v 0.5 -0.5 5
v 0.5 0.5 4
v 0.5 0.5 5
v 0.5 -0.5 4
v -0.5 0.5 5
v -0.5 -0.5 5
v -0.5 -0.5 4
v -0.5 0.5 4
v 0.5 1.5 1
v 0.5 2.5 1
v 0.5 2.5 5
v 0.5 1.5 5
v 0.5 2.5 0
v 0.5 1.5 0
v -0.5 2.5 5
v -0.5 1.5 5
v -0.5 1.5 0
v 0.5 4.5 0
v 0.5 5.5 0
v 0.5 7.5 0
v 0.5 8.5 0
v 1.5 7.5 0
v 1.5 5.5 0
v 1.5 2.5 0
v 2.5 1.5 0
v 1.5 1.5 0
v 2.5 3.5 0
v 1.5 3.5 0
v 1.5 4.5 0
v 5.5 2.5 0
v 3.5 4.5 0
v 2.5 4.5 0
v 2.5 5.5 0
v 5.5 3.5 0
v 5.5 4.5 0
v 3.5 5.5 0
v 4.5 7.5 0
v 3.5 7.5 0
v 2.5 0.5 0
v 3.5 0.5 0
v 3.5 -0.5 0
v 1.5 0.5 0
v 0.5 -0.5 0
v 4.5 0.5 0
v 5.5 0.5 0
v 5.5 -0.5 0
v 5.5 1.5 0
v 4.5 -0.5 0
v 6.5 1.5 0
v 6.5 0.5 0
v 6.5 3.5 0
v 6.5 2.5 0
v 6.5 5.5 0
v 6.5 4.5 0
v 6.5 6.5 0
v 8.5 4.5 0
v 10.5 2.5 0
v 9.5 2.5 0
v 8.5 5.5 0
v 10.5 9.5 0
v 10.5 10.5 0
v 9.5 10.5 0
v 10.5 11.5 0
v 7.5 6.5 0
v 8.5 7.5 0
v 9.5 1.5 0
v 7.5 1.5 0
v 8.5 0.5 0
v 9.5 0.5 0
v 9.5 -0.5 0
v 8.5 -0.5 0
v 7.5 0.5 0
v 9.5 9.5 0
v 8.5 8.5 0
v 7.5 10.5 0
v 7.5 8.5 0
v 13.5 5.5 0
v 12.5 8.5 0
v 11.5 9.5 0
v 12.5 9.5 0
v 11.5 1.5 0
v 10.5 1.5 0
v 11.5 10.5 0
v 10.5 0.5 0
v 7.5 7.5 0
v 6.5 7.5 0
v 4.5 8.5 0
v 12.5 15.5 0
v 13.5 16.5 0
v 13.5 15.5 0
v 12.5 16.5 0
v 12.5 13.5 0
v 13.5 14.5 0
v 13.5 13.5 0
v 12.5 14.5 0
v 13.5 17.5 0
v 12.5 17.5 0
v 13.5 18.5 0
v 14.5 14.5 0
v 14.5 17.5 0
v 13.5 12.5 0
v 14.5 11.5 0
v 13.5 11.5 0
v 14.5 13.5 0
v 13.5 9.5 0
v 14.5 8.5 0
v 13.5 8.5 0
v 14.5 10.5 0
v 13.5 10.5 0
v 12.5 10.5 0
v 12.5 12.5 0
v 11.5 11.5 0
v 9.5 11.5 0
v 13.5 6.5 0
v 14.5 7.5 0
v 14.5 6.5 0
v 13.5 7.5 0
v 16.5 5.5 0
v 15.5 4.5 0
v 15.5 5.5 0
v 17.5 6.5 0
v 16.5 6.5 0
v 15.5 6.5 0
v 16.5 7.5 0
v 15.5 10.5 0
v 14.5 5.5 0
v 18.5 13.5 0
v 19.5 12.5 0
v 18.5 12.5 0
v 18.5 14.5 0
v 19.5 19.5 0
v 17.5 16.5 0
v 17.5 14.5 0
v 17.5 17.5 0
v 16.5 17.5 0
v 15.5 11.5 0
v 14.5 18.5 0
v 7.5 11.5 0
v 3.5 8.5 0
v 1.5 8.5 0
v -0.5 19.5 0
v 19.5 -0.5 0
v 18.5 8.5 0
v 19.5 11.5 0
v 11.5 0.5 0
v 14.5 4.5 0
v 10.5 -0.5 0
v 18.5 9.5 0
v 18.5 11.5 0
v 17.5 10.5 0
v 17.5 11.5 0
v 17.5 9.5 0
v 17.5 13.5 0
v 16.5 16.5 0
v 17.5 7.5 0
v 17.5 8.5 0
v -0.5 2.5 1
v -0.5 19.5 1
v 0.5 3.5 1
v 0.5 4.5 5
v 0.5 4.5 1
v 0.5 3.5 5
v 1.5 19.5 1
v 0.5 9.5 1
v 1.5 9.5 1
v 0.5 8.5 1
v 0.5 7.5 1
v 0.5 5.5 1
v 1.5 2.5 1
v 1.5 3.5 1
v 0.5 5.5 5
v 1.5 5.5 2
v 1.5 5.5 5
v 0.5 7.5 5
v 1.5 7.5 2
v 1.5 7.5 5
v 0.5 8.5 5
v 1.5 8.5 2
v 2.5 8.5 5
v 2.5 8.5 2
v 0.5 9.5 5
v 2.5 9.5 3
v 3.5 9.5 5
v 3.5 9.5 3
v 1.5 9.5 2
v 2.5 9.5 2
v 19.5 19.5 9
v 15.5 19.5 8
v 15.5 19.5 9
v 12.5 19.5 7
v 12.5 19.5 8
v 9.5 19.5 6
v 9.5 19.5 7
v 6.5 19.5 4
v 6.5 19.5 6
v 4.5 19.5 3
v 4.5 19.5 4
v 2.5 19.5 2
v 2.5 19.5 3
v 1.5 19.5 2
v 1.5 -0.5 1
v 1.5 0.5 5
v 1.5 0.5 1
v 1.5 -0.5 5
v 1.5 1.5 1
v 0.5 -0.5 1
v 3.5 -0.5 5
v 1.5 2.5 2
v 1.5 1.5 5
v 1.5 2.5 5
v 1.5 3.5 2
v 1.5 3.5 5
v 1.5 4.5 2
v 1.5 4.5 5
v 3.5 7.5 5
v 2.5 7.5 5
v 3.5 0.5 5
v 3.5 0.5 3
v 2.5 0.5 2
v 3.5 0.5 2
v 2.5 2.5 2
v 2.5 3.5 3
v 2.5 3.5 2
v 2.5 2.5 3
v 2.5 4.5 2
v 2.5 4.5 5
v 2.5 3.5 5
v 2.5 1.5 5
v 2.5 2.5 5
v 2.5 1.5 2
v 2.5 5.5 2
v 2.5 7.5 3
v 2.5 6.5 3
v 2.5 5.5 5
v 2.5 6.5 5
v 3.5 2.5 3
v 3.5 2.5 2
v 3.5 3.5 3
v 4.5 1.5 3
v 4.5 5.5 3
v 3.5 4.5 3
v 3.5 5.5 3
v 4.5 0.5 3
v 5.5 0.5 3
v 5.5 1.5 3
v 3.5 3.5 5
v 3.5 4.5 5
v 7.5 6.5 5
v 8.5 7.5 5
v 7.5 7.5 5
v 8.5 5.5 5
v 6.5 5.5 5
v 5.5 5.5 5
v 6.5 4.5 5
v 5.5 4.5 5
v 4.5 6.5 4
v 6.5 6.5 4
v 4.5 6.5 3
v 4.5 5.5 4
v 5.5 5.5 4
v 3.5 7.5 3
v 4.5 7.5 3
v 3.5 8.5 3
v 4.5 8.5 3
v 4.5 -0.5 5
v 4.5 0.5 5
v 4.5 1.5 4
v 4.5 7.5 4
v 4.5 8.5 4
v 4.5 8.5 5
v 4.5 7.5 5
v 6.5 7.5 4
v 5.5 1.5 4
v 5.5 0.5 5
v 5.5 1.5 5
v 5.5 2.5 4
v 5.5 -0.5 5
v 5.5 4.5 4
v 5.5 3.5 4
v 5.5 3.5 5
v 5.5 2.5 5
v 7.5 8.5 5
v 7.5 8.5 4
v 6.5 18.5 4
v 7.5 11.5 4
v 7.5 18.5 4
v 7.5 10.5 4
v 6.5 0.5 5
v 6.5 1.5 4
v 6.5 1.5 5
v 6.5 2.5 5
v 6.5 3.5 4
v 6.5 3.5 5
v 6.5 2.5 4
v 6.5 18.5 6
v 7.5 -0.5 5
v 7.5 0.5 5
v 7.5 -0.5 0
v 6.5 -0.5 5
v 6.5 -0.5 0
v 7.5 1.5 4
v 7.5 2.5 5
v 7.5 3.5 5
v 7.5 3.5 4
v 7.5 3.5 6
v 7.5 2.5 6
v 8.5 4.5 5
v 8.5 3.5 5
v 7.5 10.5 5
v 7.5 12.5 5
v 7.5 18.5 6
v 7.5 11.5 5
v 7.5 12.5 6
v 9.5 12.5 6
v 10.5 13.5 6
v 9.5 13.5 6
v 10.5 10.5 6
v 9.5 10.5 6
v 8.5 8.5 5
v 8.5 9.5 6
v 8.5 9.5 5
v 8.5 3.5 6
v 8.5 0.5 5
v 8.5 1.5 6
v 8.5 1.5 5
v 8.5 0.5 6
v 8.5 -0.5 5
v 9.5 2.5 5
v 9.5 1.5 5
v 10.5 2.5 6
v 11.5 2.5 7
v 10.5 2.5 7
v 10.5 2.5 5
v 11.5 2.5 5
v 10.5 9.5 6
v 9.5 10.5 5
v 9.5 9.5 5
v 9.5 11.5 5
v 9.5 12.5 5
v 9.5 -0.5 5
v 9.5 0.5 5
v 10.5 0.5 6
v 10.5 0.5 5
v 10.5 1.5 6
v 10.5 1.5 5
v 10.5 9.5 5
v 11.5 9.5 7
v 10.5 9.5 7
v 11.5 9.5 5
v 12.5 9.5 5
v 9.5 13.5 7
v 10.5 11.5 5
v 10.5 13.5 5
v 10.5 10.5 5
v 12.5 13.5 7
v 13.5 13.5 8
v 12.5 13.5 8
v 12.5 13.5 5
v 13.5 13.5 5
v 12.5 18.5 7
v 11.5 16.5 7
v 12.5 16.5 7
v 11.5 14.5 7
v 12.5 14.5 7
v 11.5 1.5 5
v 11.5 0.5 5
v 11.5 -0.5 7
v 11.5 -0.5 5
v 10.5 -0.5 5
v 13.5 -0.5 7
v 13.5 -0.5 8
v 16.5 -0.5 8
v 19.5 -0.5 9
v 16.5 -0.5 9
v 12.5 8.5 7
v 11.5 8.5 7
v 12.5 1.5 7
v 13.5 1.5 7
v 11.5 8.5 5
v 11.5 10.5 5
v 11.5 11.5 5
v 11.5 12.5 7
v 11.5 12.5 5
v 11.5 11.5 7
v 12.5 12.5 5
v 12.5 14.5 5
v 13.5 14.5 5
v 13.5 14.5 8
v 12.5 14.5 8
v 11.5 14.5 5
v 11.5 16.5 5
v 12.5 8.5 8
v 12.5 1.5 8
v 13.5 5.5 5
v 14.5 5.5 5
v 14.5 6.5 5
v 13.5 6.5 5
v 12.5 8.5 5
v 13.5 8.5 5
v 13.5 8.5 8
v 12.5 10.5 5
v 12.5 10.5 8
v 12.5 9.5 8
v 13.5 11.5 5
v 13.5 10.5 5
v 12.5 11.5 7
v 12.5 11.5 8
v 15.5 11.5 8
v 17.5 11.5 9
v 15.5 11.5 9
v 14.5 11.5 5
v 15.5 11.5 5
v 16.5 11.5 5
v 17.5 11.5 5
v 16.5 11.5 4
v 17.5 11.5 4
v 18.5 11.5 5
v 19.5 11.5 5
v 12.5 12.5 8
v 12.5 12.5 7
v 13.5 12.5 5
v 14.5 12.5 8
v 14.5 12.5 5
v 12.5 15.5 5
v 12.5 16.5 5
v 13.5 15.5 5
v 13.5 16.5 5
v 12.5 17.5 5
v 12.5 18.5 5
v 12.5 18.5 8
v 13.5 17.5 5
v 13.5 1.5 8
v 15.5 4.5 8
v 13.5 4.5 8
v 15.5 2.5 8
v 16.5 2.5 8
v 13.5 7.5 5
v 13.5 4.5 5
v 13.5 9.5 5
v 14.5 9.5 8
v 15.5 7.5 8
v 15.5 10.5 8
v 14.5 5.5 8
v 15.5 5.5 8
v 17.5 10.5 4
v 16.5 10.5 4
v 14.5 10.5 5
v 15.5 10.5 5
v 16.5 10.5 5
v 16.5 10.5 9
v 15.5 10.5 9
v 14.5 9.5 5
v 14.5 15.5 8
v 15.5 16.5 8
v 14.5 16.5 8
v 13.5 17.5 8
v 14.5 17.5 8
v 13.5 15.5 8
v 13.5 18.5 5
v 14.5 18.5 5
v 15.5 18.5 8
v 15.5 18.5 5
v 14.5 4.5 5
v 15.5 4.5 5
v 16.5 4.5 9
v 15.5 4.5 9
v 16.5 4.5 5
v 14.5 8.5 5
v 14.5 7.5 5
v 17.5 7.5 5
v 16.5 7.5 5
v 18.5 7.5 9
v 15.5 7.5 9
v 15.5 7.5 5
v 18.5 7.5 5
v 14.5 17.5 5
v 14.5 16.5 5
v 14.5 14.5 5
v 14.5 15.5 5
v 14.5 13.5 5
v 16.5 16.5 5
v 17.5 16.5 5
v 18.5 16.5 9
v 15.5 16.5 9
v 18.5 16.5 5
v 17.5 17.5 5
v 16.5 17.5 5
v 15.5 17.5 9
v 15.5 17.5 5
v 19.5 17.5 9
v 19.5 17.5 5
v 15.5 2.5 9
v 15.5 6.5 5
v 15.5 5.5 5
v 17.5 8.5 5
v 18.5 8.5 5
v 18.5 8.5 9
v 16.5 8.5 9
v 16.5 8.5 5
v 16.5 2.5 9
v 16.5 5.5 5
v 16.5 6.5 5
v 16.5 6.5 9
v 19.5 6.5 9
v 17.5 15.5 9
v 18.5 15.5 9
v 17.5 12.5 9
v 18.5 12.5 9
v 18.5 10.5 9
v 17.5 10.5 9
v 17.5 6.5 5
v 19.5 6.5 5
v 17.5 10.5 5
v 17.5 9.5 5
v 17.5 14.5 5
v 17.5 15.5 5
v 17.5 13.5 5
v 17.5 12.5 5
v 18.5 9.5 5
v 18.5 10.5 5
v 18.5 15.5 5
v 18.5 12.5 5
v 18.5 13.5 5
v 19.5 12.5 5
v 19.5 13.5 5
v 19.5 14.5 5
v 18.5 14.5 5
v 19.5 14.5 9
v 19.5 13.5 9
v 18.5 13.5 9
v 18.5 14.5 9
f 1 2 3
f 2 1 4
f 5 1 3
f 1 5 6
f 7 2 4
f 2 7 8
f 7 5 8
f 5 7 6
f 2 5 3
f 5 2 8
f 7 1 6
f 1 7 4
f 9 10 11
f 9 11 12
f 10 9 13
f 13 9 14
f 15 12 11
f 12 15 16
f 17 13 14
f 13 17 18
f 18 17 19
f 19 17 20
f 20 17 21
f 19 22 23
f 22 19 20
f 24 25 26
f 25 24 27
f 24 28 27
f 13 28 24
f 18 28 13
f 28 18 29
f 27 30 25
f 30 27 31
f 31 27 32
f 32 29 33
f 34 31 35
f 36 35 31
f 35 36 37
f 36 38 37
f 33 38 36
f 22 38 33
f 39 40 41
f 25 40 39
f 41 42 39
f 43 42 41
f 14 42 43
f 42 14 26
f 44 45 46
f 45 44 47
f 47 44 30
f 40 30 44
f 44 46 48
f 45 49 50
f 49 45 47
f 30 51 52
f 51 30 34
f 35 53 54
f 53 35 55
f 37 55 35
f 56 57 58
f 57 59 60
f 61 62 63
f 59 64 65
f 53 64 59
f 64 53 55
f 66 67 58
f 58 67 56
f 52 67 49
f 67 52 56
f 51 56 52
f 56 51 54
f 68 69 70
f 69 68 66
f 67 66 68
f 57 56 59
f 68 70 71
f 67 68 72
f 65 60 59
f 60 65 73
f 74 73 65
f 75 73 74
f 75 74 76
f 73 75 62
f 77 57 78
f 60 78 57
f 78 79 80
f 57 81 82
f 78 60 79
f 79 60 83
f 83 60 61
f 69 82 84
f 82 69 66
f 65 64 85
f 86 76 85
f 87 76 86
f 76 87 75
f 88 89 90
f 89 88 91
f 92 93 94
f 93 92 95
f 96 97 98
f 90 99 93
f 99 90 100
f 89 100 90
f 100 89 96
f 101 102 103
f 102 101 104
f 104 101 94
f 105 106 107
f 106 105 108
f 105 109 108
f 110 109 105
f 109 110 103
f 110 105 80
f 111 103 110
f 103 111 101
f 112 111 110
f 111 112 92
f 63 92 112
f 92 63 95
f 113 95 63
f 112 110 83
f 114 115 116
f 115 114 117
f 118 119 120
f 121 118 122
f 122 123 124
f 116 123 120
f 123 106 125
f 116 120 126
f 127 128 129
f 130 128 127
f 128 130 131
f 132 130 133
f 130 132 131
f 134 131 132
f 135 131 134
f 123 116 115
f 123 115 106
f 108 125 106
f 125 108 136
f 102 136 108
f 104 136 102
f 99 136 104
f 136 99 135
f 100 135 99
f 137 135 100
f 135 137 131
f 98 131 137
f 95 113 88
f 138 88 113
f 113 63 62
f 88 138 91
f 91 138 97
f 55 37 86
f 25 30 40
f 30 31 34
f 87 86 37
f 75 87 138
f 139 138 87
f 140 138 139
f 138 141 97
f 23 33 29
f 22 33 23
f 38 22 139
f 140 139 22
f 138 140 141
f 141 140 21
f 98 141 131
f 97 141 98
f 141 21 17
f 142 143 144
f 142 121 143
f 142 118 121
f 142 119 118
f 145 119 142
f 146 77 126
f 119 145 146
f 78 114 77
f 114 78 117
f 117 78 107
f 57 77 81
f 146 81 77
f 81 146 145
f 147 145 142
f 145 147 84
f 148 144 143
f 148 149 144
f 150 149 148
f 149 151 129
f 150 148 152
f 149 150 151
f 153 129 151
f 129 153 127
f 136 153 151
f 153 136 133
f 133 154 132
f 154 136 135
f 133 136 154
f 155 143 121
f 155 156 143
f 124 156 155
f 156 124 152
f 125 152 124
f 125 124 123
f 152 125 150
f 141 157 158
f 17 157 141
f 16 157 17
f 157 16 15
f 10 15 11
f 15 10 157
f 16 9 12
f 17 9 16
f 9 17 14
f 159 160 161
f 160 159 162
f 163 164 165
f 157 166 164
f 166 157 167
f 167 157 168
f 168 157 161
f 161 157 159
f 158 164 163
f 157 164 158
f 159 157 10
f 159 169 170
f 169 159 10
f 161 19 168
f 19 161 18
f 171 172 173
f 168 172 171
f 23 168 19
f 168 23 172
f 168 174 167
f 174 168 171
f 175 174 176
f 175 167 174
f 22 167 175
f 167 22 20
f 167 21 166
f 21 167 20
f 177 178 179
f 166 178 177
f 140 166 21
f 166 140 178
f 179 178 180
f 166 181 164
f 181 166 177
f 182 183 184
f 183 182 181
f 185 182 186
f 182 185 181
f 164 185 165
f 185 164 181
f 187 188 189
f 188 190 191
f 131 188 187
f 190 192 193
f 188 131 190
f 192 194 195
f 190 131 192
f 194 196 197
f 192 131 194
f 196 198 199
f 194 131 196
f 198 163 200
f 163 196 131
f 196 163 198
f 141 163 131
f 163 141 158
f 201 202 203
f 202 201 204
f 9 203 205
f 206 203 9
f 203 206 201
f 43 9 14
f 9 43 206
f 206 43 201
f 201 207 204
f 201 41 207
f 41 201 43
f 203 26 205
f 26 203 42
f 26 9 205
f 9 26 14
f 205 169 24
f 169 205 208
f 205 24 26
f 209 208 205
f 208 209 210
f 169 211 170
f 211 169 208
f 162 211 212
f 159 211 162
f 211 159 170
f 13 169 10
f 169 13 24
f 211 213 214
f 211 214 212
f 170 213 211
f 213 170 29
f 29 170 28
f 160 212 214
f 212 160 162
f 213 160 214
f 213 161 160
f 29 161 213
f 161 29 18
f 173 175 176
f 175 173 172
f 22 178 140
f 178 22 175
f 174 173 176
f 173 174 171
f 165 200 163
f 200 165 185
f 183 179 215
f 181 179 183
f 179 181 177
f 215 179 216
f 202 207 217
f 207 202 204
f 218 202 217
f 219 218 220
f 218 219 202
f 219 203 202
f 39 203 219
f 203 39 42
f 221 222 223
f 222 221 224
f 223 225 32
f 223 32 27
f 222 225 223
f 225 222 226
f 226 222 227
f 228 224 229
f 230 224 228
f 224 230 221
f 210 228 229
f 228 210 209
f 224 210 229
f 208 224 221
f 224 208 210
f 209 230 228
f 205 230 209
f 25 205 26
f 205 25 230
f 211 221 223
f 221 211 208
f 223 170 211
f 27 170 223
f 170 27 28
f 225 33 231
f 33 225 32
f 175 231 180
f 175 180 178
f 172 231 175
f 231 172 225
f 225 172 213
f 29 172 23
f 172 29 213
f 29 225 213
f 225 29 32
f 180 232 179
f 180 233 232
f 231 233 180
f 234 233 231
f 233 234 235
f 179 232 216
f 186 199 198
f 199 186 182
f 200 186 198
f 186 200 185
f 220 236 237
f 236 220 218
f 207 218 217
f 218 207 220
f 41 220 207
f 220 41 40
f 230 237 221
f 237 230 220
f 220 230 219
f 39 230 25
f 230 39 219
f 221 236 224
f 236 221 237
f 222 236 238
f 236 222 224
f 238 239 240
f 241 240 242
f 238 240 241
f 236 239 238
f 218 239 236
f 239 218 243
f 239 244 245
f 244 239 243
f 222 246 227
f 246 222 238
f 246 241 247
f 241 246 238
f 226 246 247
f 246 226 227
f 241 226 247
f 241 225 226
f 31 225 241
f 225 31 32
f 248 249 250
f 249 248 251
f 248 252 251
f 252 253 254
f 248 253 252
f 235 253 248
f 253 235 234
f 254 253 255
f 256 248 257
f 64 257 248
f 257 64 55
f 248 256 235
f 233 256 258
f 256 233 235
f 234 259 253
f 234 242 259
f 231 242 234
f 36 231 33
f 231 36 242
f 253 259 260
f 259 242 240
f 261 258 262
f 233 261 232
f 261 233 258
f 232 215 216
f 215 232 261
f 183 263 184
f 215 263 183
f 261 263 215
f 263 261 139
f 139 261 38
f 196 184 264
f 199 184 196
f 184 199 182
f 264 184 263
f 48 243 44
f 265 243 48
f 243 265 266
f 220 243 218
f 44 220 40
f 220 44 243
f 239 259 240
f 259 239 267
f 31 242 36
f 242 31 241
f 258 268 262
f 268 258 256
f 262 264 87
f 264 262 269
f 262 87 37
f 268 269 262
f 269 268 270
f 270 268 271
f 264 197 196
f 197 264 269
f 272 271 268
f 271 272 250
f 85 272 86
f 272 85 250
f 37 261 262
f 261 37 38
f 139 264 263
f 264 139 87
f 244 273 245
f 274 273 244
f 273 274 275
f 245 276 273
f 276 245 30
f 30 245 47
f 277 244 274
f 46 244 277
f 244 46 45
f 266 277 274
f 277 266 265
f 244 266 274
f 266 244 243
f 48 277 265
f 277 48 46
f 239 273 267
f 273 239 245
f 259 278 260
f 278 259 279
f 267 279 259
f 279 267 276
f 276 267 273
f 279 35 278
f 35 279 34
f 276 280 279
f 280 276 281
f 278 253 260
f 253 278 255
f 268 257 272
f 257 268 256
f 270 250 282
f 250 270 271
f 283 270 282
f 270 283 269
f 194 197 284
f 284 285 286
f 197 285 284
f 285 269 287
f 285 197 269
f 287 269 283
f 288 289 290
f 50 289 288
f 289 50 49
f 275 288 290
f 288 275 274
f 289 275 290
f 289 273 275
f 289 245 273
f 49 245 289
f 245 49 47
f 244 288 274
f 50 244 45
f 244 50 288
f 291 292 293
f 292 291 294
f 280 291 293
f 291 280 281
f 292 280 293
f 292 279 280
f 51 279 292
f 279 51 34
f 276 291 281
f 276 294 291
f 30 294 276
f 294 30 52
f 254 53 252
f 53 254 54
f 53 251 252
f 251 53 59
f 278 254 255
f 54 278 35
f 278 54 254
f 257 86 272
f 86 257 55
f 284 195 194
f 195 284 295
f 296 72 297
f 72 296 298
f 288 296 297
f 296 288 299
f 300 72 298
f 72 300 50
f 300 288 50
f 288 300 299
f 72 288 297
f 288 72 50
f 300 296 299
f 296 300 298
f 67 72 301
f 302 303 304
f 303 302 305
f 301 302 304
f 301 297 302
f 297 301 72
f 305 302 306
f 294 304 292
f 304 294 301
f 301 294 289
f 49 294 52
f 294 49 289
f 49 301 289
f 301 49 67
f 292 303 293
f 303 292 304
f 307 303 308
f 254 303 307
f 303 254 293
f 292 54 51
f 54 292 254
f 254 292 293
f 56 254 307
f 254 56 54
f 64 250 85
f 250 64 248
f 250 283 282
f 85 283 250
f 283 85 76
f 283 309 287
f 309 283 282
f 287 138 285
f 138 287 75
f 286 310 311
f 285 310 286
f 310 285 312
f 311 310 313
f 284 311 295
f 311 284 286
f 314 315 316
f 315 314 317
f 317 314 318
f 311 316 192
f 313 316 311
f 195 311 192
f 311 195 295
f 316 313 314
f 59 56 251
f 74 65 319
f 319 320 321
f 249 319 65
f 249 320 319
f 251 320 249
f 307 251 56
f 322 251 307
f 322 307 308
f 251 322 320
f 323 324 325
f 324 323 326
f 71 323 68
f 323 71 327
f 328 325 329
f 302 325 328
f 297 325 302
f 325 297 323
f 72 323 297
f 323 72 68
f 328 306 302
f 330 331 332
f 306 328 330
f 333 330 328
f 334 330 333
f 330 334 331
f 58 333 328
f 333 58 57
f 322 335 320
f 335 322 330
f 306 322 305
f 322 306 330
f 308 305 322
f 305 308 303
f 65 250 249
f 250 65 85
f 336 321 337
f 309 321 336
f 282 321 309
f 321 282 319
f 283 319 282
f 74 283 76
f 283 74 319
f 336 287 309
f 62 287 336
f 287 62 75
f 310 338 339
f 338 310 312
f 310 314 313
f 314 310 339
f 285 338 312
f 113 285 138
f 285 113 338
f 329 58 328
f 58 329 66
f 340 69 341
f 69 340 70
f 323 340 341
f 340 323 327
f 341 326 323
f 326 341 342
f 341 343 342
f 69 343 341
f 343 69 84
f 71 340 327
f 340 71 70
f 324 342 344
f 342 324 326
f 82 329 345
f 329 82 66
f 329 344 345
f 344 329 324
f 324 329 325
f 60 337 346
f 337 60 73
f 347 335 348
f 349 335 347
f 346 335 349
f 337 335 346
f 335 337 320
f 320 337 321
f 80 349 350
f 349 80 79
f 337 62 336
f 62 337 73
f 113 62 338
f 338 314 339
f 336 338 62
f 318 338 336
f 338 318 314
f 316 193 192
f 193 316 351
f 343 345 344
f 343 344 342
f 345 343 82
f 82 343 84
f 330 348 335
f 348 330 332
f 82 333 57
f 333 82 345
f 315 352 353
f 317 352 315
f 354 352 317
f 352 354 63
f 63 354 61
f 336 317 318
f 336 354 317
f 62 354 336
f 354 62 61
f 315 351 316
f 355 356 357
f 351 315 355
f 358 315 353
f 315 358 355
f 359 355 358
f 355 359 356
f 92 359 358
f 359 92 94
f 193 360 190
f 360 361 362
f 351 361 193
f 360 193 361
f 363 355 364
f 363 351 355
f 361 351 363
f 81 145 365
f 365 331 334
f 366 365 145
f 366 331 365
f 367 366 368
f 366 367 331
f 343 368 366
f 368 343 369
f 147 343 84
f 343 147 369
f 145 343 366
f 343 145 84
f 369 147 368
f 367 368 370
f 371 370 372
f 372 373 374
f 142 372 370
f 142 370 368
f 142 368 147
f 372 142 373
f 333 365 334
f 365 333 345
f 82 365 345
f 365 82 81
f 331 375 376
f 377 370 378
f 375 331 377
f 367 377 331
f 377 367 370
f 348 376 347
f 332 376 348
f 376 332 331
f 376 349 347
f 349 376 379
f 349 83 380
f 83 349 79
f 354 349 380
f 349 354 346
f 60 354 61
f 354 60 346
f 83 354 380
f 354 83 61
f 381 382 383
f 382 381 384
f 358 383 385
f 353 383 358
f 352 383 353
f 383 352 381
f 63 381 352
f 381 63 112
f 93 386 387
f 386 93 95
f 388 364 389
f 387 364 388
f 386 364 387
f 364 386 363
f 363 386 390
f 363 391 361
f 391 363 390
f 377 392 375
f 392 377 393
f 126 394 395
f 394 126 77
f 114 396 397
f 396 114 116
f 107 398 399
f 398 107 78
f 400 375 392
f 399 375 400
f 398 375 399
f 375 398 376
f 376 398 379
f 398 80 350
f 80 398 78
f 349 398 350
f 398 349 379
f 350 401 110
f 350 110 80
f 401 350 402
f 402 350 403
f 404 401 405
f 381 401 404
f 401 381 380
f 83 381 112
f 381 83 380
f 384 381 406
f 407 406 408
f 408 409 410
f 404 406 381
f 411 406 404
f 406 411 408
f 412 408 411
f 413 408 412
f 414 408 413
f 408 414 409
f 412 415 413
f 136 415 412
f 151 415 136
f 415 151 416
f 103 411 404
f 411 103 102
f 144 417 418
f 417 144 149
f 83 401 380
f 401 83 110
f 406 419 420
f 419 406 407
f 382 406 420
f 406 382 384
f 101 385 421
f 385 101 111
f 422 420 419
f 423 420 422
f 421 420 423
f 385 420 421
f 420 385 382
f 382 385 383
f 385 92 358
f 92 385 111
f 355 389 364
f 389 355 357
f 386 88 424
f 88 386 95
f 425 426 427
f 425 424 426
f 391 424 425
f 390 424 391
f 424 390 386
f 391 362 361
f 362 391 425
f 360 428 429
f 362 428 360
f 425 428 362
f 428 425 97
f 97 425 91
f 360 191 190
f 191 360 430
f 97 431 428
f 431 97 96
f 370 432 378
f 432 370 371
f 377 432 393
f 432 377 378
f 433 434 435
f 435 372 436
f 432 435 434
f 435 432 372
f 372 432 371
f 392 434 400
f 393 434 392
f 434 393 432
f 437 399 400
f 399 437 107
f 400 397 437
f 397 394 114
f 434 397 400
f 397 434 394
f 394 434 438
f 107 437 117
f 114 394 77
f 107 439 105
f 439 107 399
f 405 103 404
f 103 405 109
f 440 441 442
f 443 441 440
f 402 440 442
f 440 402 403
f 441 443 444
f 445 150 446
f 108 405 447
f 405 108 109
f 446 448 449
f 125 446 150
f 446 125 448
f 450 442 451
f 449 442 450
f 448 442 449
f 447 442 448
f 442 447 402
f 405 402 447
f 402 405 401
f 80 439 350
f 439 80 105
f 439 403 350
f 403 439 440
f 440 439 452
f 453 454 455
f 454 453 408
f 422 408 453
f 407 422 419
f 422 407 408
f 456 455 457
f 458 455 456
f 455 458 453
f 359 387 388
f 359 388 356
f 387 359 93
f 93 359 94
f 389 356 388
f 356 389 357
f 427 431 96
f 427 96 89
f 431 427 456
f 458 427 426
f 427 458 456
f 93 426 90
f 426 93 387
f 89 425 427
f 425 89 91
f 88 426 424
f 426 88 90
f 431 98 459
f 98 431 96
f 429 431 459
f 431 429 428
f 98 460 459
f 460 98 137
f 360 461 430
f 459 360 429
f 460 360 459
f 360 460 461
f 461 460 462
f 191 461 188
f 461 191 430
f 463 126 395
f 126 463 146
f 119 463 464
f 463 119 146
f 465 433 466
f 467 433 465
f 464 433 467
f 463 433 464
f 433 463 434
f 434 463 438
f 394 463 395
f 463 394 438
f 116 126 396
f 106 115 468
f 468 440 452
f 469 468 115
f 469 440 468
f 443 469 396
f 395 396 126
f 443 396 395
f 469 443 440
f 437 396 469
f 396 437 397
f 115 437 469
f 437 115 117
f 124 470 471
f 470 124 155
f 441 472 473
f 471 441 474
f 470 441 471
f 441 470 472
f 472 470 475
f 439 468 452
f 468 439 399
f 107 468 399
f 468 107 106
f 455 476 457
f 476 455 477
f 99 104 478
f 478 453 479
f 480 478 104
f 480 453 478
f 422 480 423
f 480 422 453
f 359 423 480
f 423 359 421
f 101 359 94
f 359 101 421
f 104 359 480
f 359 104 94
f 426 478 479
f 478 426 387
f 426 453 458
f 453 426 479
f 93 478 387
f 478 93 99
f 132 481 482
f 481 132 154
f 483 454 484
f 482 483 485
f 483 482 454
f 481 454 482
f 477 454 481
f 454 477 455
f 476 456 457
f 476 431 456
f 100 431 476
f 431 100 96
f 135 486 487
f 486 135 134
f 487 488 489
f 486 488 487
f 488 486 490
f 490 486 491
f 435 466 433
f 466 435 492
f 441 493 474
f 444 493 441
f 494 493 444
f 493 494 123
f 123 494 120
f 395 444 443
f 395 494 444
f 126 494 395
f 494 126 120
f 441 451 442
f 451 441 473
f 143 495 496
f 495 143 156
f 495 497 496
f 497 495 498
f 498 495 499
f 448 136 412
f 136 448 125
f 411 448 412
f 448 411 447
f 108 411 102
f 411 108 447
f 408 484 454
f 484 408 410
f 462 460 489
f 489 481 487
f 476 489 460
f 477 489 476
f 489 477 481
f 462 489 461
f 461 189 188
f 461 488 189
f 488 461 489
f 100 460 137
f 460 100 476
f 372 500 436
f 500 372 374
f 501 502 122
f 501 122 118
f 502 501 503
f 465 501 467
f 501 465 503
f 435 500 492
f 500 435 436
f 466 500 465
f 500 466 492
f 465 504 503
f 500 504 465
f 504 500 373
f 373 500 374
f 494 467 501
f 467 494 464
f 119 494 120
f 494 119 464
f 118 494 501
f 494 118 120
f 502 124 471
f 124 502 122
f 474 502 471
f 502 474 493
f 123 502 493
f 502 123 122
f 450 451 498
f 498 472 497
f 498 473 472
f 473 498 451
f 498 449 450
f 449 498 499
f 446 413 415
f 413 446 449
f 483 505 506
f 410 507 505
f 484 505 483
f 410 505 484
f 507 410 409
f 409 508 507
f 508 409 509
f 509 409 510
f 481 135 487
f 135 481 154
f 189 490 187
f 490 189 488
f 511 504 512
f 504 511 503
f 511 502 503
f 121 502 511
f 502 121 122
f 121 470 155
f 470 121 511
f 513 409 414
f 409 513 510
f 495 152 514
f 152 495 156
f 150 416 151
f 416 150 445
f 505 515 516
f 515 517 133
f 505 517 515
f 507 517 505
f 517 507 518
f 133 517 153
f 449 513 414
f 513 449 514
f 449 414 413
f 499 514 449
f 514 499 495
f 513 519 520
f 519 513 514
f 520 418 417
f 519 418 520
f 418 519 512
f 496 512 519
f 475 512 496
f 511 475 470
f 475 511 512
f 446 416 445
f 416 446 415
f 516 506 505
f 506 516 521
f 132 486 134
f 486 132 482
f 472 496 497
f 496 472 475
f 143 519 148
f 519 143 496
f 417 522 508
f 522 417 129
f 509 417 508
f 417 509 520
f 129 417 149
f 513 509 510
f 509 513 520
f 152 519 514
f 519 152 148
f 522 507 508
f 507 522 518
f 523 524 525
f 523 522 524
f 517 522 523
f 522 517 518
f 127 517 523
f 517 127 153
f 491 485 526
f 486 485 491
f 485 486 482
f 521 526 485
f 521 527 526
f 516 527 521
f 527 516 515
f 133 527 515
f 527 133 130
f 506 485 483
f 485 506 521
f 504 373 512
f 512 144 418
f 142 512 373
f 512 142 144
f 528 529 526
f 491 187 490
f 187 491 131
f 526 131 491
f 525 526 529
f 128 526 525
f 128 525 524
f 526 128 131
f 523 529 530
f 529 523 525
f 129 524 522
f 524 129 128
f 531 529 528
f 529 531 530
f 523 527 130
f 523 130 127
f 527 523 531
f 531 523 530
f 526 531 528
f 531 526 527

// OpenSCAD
union() {
    translate([0, 0, 4.5]) color([1, 0, 0]) cube([1, 1, 1], center=true);
    translate([0, 2, 2.5]) cube([1, 1, 5], center=true);
    translate([0, 3, 0.5]) cube([1, 1, 1], center=true);
    translate([0, 4, 0.5]) cube([1, 1, 1], center=true);
    translate([0, 5, 0.5]) cube([1, 1, 1], center=true);
    translate([0, 6, 0.5]) cube([1, 1, 1], center=true);
    translate([0, 7, 0.5]) cube([1, 1, 1], center=true);
    translate([0, 8, 0.5]) cube([1, 1, 1], center=true);
    translate([0, 9, 0.5]) cube([1, 1, 1], center=true);
    translate([0, 10, 0.5]) cube([1, 1, 1], center=true);
    translate([0, 11, 0.5]) cube([1, 1, 1], center=true);
    translate([0, 12, 0.5]) cube([1, 1, 1], center=true);
    translate([0, 13, 0.5]) cube([1, 1, 1], center=true);
    translate([0, 14, 0.5]) cube([1, 1, 1], center=true);
    translate([0, 15, 0.5]) cube([1, 1, 1], center=true);
    translate([0, 16, 0.5]) cube([1, 1, 1], center=true);
    translate([0, 17, 0.5]) cube([1, 1, 1], center=true);
    translate([0, 18, 0.5]) cube([1, 1, 1], center=true);
    translate([0, 19, 0.5]) cube([1, 1, 1], center=true);
    translate([1, 0, 0.5]) cube([1, 1, 1], center=true);
    translate([1, 1, 0.5]) cube([1, 1, 1], center=true);
    translate([1, 3, 0.5]) cube([1, 1, 1], center=true);
    translate([1, 4, 2.5]) cube([1, 1, 5], center=true);
    translate([1, 6, 2.5]) cube([1, 1, 5], center=true);
    translate([1, 7, 2.5]) cube([1, 1, 5], center=true);
    translate([1, 9, 2.5]) cube([1, 1, 5], center=true);
    translate([1, 10, 0.5]) cube([1, 1, 1], center=true);
    translate([1, 11, 0.5]) cube([1, 1, 1], center=true);
    translate([1, 12, 0.5]) cube([1, 1, 1], center=true);
    translate([1, 13, 0.5]) cube([1, 1, 1], center=true);
    translate([1, 14, 0.5]) cube([1, 1, 1], center=true);
    translate([1, 15, 0.5]) cube([1, 1, 1], center=true);
    translate([1, 16, 0.5]) cube([1, 1, 1], center=true);
    translate([1, 17, 0.5]) cube([1, 1, 1], center=true);
    translate([1, 18, 0.5]) cube([1, 1, 1], center=true);
    translate([1, 19, 0.5]) cube([1, 1, 1], center=true);
    translate([2, 0, 2.5]) cube([1, 1, 5], center=true);
    translate([2, 2, 2.5]) cube([1, 1, 5], center=true);
    translate([2, 3, 1.0]) cube([1, 1, 2], center=true);
    translate([2, 5, 1.0]) cube([1, 1, 2], center=true);
    translate([2, 6, 1.0]) cube([1, 1, 2], center=true);
    translate([2, 7, 1.0]) cube([1, 1, 2], center=true);
    translate([2, 8, 1.0]) cube([1, 1, 2], center=true);
    translate([2, 9, 2.5]) cube([1, 1, 5], center=true);
    translate([2, 10, 1.0]) cube([1, 1, 2], center=true);
    translate([2, 11, 1.0]) cube([1, 1, 2], center=true);
    translate([2, 12, 1.0]) cube([1, 1, 2], center=true);
    translate([2, 13, 1.0]) cube([1, 1, 2], center=true);
    translate([2, 14, 1.0]) cube([1, 1, 2], center=true);
    translate([2, 15, 1.0]) cube([1, 1, 2], center=true);
    translate([2, 16, 1.0]) cube([1, 1, 2], center=true);
    translate([2, 17, 1.0]) cube([1, 1, 2], center=true);
    translate([2, 18, 1.0]) cube([1, 1, 2], center=true);
    translate([2, 19, 1.0]) cube([1, 1, 2], center=true);
    translate([3, 0, 2.5]) cube([1, 1, 5], center=true);
    translate([3, 1, 1.0]) cube([1, 1, 2], center=true);
    translate([3, 2, 1.0]) cube([1, 1, 2], center=true);
    translate([3, 3, 1.5]) cube([1, 1, 3], center=true);
    translate([3, 4, 2.5]) cube([1, 1, 5], center=true);
    translate([3, 6, 2.5]) cube([1, 1, 5], center=true);
    translate([3, 7, 1.5]) cube([1, 1, 3], center=true);
    translate([3, 8, 2.5]) cube([1, 1, 5], center=true);
    translate([3, 9, 2.5]) cube([1, 1, 5], center=true);
    translate([3, 10, 1.5]) cube([1, 1, 3], center=true);
    translate([3, 11, 1.5]) cube([1, 1, 3], center=true);
    translate([3, 12, 1.5]) cube([1, 1, 3], center=true);
    translate([3, 13, 1.5]) cube([1, 1, 3], center=true);
    translate([3, 14, 1.5]) cube([1, 1, 3], center=true);
    translate([3, 15, 1.5]) cube([1, 1, 3], center=true);
    translate([3, 16, 1.5]) cube([1, 1, 3], center=true);
    translate([3, 17, 1.5]) cube([1, 1, 3], center=true);
    translate([3, 18, 1.5]) cube([1, 1, 3], center=true);
    translate([3, 19, 1.5]) cube([1, 1, 3], center=true);
    translate([4, 1, 1.5]) cube([1, 1, 3], center=true);
    translate([4, 2, 1.5]) cube([1, 1, 3], center=true);
    translate([4, 3, 1.5]) cube([1, 1, 3], center=true);
    translate([4, 4, 1.5]) cube([1, 1, 3], center=true);
    translate([4, 5, 1.5]) cube([1, 1, 3], center=true);
    translate([4, 6, 2.5]) cube([1, 1, 5], center=true);
    translate([4, 7, 1.5]) cube([1, 1, 3], center=true);
    translate([4, 9, 1.5]) cube([1, 1, 3], center=true);
    translate([4, 10, 1.5]) cube([1, 1, 3], center=true);
    translate([4, 11, 1.5]) cube([1, 1, 3], center=true);
    translate([4, 12, 1.5]) cube([1, 1, 3], center=true);
    translate([4, 13, 1.5]) cube([1, 1, 3], center=true);
    translate([4, 14, 1.5]) cube([1, 1, 3], center=true);
    translate([4, 15, 1.5]) cube([1, 1, 3], center=true);
    translate([4, 16, 1.5]) cube([1, 1, 3], center=true);
    translate([4, 17, 1.5]) cube([1, 1, 3], center=true);
    translate([4, 18, 1.5]) cube([1, 1, 3], center=true);
    translate([4, 19, 1.5]) cube([1, 1, 3], center=true);
    translate([5, 0, 2.5]) cube([1, 1, 5], center=true);
    translate([5, 1, 1.5]) cube([1, 1, 3], center=true);
    translate([5, 2, 2.0]) cube([1, 1, 4], center=true);
    translate([5, 3, 2.0]) cube([1, 1, 4], center=true);
    translate([5, 4, 2.0]) cube([1, 1, 4], center=true);
    translate([5, 5, 2.0]) cube([1, 1, 4], center=true);
    translate([5, 6, 2.5]) cube([1, 1, 5], center=true);
    translate([5, 7, 2.0]) cube([1, 1, 4], center=true);
    translate([5, 8, 2.5]) cube([1, 1, 5], center=true);
    translate([5, 9, 2.0]) cube([1, 1, 4], center=true);
    translate([5, 10, 2.0]) cube([1, 1, 4], center=true);
    translate([5, 11, 2.0]) cube([1, 1, 4], center=true);
    translate([5, 12, 2.0]) cube([1, 1, 4], center=true);
    translate([5, 13, 2.0]) cube([1, 1, 4], center=true);
    translate([5, 14, 2.0]) cube([1, 1, 4], center=true);
    translate([5, 15, 2.0]) cube([1, 1, 4], center=true);
    translate([5, 16, 2.0]) cube([1, 1, 4], center=true);
    translate([5, 17, 2.0]) cube([1, 1, 4], center=true);
    translate([5, 18, 2.0]) cube([1, 1, 4], center=true);
    translate([5, 19, 2.0]) cube([1, 1, 4], center=true);
    translate([6, 1, 2.5]) cube([1, 1, 5], center=true);
    translate([6, 3, 2.5]) cube([1, 1, 5], center=true);
    translate([6, 5, 2.5]) cube([1, 1, 5], center=true);
    translate([6, 6, 2.5]) cube([1, 1, 5], center=true);
    translate([6, 7, 2.0]) cube([1, 1, 4], center=true);
    translate([6, 8, 2.5]) cube([1, 1, 5], center=true);
    translate([6, 9, 2.0]) cube([1, 1, 4], center=true);
    translate([6, 10, 2.0]) cube([1, 1, 4], center=true);
    translate([6, 11, 2.0]) cube([1, 1, 4], center=true);
    translate([6, 12, 2.0]) cube([1, 1, 4], center=true);
    translate([6, 13, 2.0]) cube([1, 1, 4], center=true);
    translate([6, 14, 2.0]) cube([1, 1, 4], center=true);
    translate([6, 15, 2.0]) cube([1, 1, 4], center=true);
    translate([6, 16, 2.0]) cube([1, 1, 4], center=true);
    translate([6, 17, 2.0]) cube([1, 1, 4], center=true);
    translate([6, 18, 2.0]) cube([1, 1, 4], center=true);
    translate([6, 19, 2.0]) cube([1, 1, 4], center=true);
    translate([7, 0, 2.5]) cube([1, 1, 5], center=true);
    translate([7, 2, 2.0]) cube([1, 1, 4], center=true);
    translate([7, 3, 2.0]) cube([1, 1, 4], center=true);
    translate([7, 4, 2.5]) cube([1, 1, 5], center=true);
    translate([7, 6, 2.5]) cube([1, 1, 5], center=true);
    translate([7, 8, 2.5]) cube([1, 1, 5], center=true);
    translate([7, 9, 2.0]) cube([1, 1, 4], center=true);
    translate([7, 10, 2.0]) cube([1, 1, 4], center=true);
    translate([7, 11, 2.0]) cube([1, 1, 4], center=true);
    translate([7, 12, 2.0]) cube([1, 1, 4], center=true);
    translate([7, 13, 2.0]) cube([1, 1, 4], center=true);
    translate([7, 14, 2.0]) cube([1, 1, 4], center=true);
    translate([7, 15, 2.0]) cube([1, 1, 4], center=true);
    translate([7, 16, 2.0]) cube([1, 1, 4], center=true);
    translate([7, 17, 2.0]) cube([1, 1, 4], center=true);
    translate([7, 18, 2.0]) cube([1, 1, 4], center=true);
    translate([7, 19, 3.0]) cube([1, 1, 6], center=true);
    translate([8, 1, 2.5]) cube([1, 1, 5], center=true);
    translate([8, 2, 2.5]) cube([1, 1, 5], center=true);
    translate([8, 3, 3.0]) cube([1, 1, 6], center=true);
    translate([8, 4, 2.5]) cube([1, 1, 5], center=true);
    translate([8, 6, 2.5]) cube([1, 1, 5], center=true);
    translate([8, 7, 2.5]) cube([1, 1, 5], center=true);
    translate([8, 9, 2.5]) cube([1, 1, 5], center=true);
    translate([8, 10, 2.5]) cube([1, 1, 5], center=true);
    translate([8, 12, 2.5]) cube([1, 1, 5], center=true);
    translate([8, 13, 3.0]) cube([1, 1, 6], center=true);
    translate([8, 14, 3.0]) cube([1, 1, 6], center=true);
    translate([8, 15, 3.0]) cube([1, 1, 6], center=true);
    translate([8, 16, 3.0]) cube([1, 1, 6], center=true);
    translate([8, 17, 3.0]) cube([1, 1, 6], center=true);
    translate([8, 18, 3.0]) cube([1, 1, 6], center=true);
    translate([8, 19, 3.0]) cube([1, 1, 6], center=true);
    translate([9, 0, 2.5]) cube([1, 1, 5], center=true);
    translate([9, 1, 3.0]) cube([1, 1, 6], center=true);
    translate([9, 2, 2.5]) cube([1, 1, 5], center=true);
    translate([9, 3, 3.0]) cube([1, 1, 6], center=true);
    translate([9, 4, 3.0]) cube([1, 1, 6], center=true);
    translate([9, 5, 3.0]) cube([1, 1, 6], center=true);
    translate([9, 6, 3.0]) cube([1, 1, 6], center=true);
    translate([9, 7, 3.0]) cube([1, 1, 6], center=true);
    translate([9, 8, 3.0]) cube([1, 1, 6], center=true);
    translate([9, 9, 3.0]) cube([1, 1, 6], center=true);
    translate([9, 10, 2.5]) cube([1, 1, 5], center=true);
    translate([9, 12, 2.5]) cube([1, 1, 5], center=true);
    translate([9, 13, 3.0]) cube([1, 1, 6], center=true);
    translate([9, 14, 3.0]) cube([1, 1, 6], center=true);
    translate([9, 15, 3.0]) cube([1, 1, 6], center=true);
    translate([9, 16, 3.0]) cube([1, 1, 6], center=true);
    translate([9, 17, 3.0]) cube([1, 1, 6], center=true);
    translate([9, 18, 3.0]) cube([1, 1, 6], center=true);
    translate([9, 19, 3.0]) cube([1, 1, 6], center=true);
    translate([10, 1, 3.0]) cube([1, 1, 6], center=true);
    translate([10, 3, 3.0]) cube([1, 1, 6], center=true);
    translate([10, 4, 3.0]) cube([1, 1, 6], center=true);
    translate([10, 5, 3.0]) cube([1, 1, 6], center=true);
    translate([10, 6, 3.0]) cube([1, 1, 6], center=true);
    translate([10, 7, 3.0]) cube([1, 1, 6], center=true);
    translate([10, 8, 3.0]) cube([1, 1, 6], center=true);
    translate([10, 9, 3.0]) cube([1, 1, 6], center=true);
    translate([10, 11, 3.0]) cube([1, 1, 6], center=true);
    translate([10, 12, 3.0]) cube([1, 1, 6], center=true);
    translate([10, 13, 3.0]) cube([1, 1, 6], center=true);
    translate([10, 14, 3.5]) cube([1, 1, 7], center=true);
    translate([10, 15, 3.5]) cube([1, 1, 7], center=true);
    translate([10, 16, 3.5]) cube([1, 1, 7], center=true);
    translate([10, 17, 3.5]) cube([1, 1, 7], center=true);
    translate([10, 18, 3.5]) cube([1, 1, 7], center=true);
    translate([10, 19, 3.5]) cube([1, 1, 7], center=true);
    translate([11, 0, 2.5]) cube([1, 1, 5], center=true);
    translate([11, 2, 2.5]) cube([1, 1, 5], center=true);
    translate([11, 3, 3.5]) cube([1, 1, 7], center=true);
    translate([11, 4, 3.5]) cube([1, 1, 7], center=true);
    translate([11, 5, 3.5]) cube([1, 1, 7], center=true);
    translate([11, 6, 3.5]) cube([1, 1, 7], center=true);
    translate([11, 7, 3.5]) cube([1, 1, 7], center=true);
    translate([11, 8, 3.5]) cube([1, 1, 7], center=true);
    translate([11, 9, 3.5]) cube([1, 1, 7], center=true);
    translate([11, 10, 2.5]) cube([1, 1, 5], center=true);
    translate([11, 12, 2.5]) cube([1, 1, 5], center=true);
    translate([11, 13, 2.5]) cube([1, 1, 5], center=true);
    translate([11, 14, 3.5]) cube([1, 1, 7], center=true);
    translate([11, 15, 3.5]) cube([1, 1, 7], center=true);
    translate([11, 16, 3.5]) cube([1, 1, 7], center=true);
    translate([11, 17, 3.5]) cube([1, 1, 7], center=true);
    translate([11, 18, 3.5]) cube([1, 1, 7], center=true);
    translate([11, 19, 3.5]) cube([1, 1, 7], center=true);
    translate([12, 0, 3.5]) cube([1, 1, 7], center=true);
    translate([12, 1, 3.5]) cube([1, 1, 7], center=true);
    translate([12, 2, 3.5]) cube([1, 1, 7], center=true);
    translate([12, 3, 3.5]) cube([1, 1, 7], center=true);
    translate([12, 4, 3.5]) cube([1, 1, 7], center=true);
    translate([12, 5, 3.5]) cube([1, 1, 7], center=true);
    translate([12, 6, 3.5]) cube([1, 1, 7], center=true);
    translate([12, 7, 3.5]) cube([1, 1, 7], center=true);
    translate([12, 8, 3.5]) cube([1, 1, 7], center=true);
    translate([12, 9, 2.5]) cube([1, 1, 5], center=true);
    translate([12, 11, 2.5]) cube([1, 1, 5], center=true);
    translate([12, 12, 3.5]) cube([1, 1, 7], center=true);
    translate([12, 13, 2.5]) cube([1, 1, 5], center=true);
    translate([12, 14, 3.5]) cube([1, 1, 7], center=true);
    translate([12, 15, 2.5]) cube([1, 1, 5], center=true);
    translate([12, 16, 2.5]) cube([1, 1, 5], center=true);
    translate([12, 17, 3.5]) cube([1, 1, 7], center=true);
    translate([12, 18, 3.5]) cube([1, 1, 7], center=true);
    translate([12, 19, 3.5]) cube([1, 1, 7], center=true);
    translate([13, 0, 3.5]) cube([1, 1, 7], center=true);
    translate([13, 1, 3.5]) cube([1, 1, 7], center=true);
    translate([13, 2, 4.0]) cube([1, 1, 8], center=true);
    translate([13, 3, 4.0]) cube([1, 1, 8], center=true);
    translate([13, 4, 4.0]) cube([1, 1, 8], center=true);
    translate([13, 5, 4.0]) cube([1, 1, 8], center=true);
    translate([13, 6, 4.0]) cube([1, 1, 8], center=true);
    translate([13, 7, 4.0]) cube([1, 1, 8], center=true);
    translate([13, 8, 4.0]) cube([1, 1, 8], center=true);
    translate([13, 10, 4.0]) cube([1, 1, 8], center=true);
    translate([13, 11, 2.5]) cube([1, 1, 5], center=true);
    translate([13, 12, 4.0]) cube([1, 1, 8], center=true);
    translate([13, 14, 4.0]) cube([1, 1, 8], center=true);
    translate([13, 16, 2.5]) cube([1, 1, 5], center=true);
    translate([13, 18, 2.5]) cube([1, 1, 5], center=true);
    translate([13, 19, 4.0]) cube([1, 1, 8], center=true);
    translate([14, 0, 4.0]) cube([1, 1, 8], center=true);
    translate([14, 1, 4.0]) cube([1, 1, 8], center=true);
    translate([14, 2, 4.0]) cube([1, 1, 8], center=true);
    translate([14, 3, 4.0]) cube([1, 1, 8], center=true);
    translate([14, 4, 4.0]) cube([1, 1, 8], center=true);
    translate([14, 5, 2.5]) cube([1, 1, 5], center=true);
    translate([14, 7, 2.5]) cube([1, 1, 5], center=true);
    translate([14, 9, 2.5]) cube([1, 1, 5], center=true);
    translate([14, 10, 4.0]) cube([1, 1, 8], center=true);
    translate([14, 12, 4.0]) cube([1, 1, 8], center=true);
    translate([14, 13, 2.5]) cube([1, 1, 5], center=true);
    translate([14, 15, 2.5]) cube([1, 1, 5], center=true);
    translate([14, 16, 4.0]) cube([1, 1, 8], center=true);
    translate([14, 17, 4.0]) cube([1, 1, 8], center=true);
    translate([14, 19, 4.0]) cube([1, 1, 8], center=true);
    translate([15, 0, 4.0]) cube([1, 1, 8], center=true);
    translate([15, 1, 4.0]) cube([1, 1, 8], center=true);
    translate([15, 2, 4.0]) cube([1, 1, 8], center=true);
    translate([15, 3, 4.0]) cube([1, 1, 8], center=true);
    translate([15, 4, 4.0]) cube([1, 1, 8], center=true);
    translate([15, 6, 4.0]) cube([1, 1, 8], center=true);
    translate([15, 7, 4.0]) cube([1, 1, 8], center=true);
    translate([15, 8, 4.0]) cube([1, 1, 8], center=true);
    translate([15, 9, 4.0]) cube([1, 1, 8], center=true);
    translate([15, 10, 4.0]) cube([1, 1, 8], center=true);
    translate([15, 11, 2.5]) cube([1, 1, 5], center=true);
    translate([15, 12, 4.0]) cube([1, 1, 8], center=true);
    translate([15, 13, 4.0]) cube([1, 1, 8], center=true);
    translate([15, 14, 4.0]) cube([1, 1, 8], center=true);
    translate([15, 15, 4.0]) cube([1, 1, 8], center=true);
    translate([15, 16, 4.0]) cube([1, 1, 8], center=true);
    translate([15, 17, 2.5]) cube([1, 1, 5], center=true);
    translate([15, 18, 2.5]) cube([1, 1, 5], center=true);
    translate([15, 19, 4.0]) cube([1, 1, 8], center=true);
    translate([16, 0, 4.0]) cube([1, 1, 8], center=true);
    translate([16, 1, 4.0]) cube([1, 1, 8], center=true);
    translate([16, 2, 4.0]) cube([1, 1, 8], center=true);
    translate([16, 3, 4.5]) cube([1, 1, 9], center=true);
    translate([16, 4, 4.5]) cube([1, 1, 9], center=true);
    translate([16, 5, 2.5]) cube([1, 1, 5], center=true);
    translate([16, 7, 2.5]) cube([1, 1, 5], center=true);
    translate([16, 8, 4.5]) cube([1, 1, 9], center=true);
    translate([16, 9, 4.5]) cube([1, 1, 9], center=true);
    translate([16, 10, 4.5]) cube([1, 1, 9], center=true);
    translate([16, 12, 4.5]) cube([1, 1, 9], center=true);
    translate([16, 13, 4.5]) cube([1, 1, 9], center=true);
    translate([16, 14, 4.5]) cube([1, 1, 9], center=true);
    translate([16, 15, 4.5]) cube([1, 1, 9], center=true);
    translate([16, 16, 4.5]) cube([1, 1, 9], center=true);
    translate([16, 17, 2.5]) cube([1, 1, 5], center=true);
    translate([16, 18, 4.5]) cube([1, 1, 9], center=true);
    translate([16, 19, 4.5]) cube([1, 1, 9], center=true);
    translate([17, 0, 4.5]) cube([1, 1, 9], center=true);
    translate([17, 1, 4.5]) cube([1, 1, 9], center=true);
    translate([17, 2, 4.5]) cube([1, 1, 9], center=true);
    translate([17, 3, 4.5]) cube([1, 1, 9], center=true);
    translate([17, 4, 4.5]) cube([1, 1, 9], center=true);
    translate([17, 5, 4.5]) cube([1, 1, 9], center=true);
    translate([17, 6, 4.5]) cube([1, 1, 9], center=true);
    translate([17, 8, 4.5]) cube([1, 1, 9], center=true);
    translate([17, 9, 2.5]) cube([1, 1, 5], center=true);
    translate([17, 10, 2.5]) cube([1, 1, 5], center=true);
    translate([17, 11, 4.5]) color([0, 0, 1]) cube([1, 1, 1], center=true);
    translate([17, 12, 4.5]) cube([1, 1, 9], center=true);
    translate([17, 13, 4.5]) cube([1, 1, 9], center=true);
    translate([17, 14, 4.5]) cube([1, 1, 9], center=true);
    translate([17, 15, 4.5]) cube([1, 1, 9], center=true);
    translate([17, 16, 4.5]) cube([1, 1, 9], center=true);
    translate([17, 18, 4.5]) cube([1, 1, 9], center=true);
    translate([17, 19, 4.5]) cube([1, 1, 9], center=true);
    translate([18, 0, 4.5]) cube([1, 1, 9], center=true);
    translate([18, 1, 4.5]) cube([1, 1, 9], center=true);
    translate([18, 2, 4.5]) cube([1, 1, 9], center=true);
    translate([18, 3, 4.5]) cube([1, 1, 9], center=true);
    translate([18, 4, 4.5]) cube([1, 1, 9], center=true);
    translate([18, 5, 4.5]) cube([1, 1, 9], center=true);
    translate([18, 6, 4.5]) cube([1, 1, 9], center=true);
    translate([18, 7, 2.5]) cube([1, 1, 5], center=true);
    translate([18, 8, 4.5]) cube([1, 1, 9], center=true);
    translate([18, 10, 2.5]) cube([1, 1, 5], center=true);
    translate([18, 11, 4.5]) cube([1, 1, 9], center=true);
    translate([18, 12, 4.5]) cube([1, 1, 9], center=true);
    translate([18, 13, 2.5]) cube([1, 1, 5], center=true);
    translate([18, 15, 2.5]) cube([1, 1, 5], center=true);
    translate([18, 16, 4.5]) cube([1, 1, 9], center=true);
    translate([18, 17, 2.5]) cube([1, 1, 5], center=true);
    translate([18, 18, 4.5]) cube([1, 1, 9], center=true);
    translate([18, 19, 4.5]) cube([1, 1, 9], center=true);
    translate([19, 0, 4.5]) cube([1, 1, 9], center=true);
    translate([19, 1, 4.5]) cube([1, 1, 9], center=true);
    translate([19, 2, 4.5]) cube([1, 1, 9], center=true);
    translate([19, 3, 4.5]) cube([1, 1, 9], center=true);
    translate([19, 4, 4.5]) cube([1, 1, 9], center=true);
    translate([19, 5, 4.5]) cube([1, 1, 9], center=true);
    translate([19, 6, 4.5]) cube([1, 1, 9], center=true);
    translate([19, 7, 2.5]) cube([1, 1, 5], center=true);
    translate([19, 8, 2.5]) cube([1, 1, 5], center=true);
    translate([19, 9, 2.5]) cube([1, 1, 5], center=true);
    translate([19, 10, 2.5]) cube([1, 1, 5], center=true);
    translate([19, 11, 2.5]) cube([1, 1, 5], center=true);
    translate([19, 13, 2.5]) cube([1, 1, 5], center=true);
    translate([19, 14, 4.5]) cube([1, 1, 9], center=true);
    translate([19, 15, 2.5]) cube([1, 1, 5], center=true);
    translate([19, 16, 2.5]) cube([1, 1, 5], center=true);
    translate([19, 17, 2.5]) cube([1, 1, 5], center=true);
    translate([19, 18, 4.5]) cube([1, 1, 9], center=true);
    translate([19, 19, 4.5]) cube([1, 1, 9], center=true);
}
